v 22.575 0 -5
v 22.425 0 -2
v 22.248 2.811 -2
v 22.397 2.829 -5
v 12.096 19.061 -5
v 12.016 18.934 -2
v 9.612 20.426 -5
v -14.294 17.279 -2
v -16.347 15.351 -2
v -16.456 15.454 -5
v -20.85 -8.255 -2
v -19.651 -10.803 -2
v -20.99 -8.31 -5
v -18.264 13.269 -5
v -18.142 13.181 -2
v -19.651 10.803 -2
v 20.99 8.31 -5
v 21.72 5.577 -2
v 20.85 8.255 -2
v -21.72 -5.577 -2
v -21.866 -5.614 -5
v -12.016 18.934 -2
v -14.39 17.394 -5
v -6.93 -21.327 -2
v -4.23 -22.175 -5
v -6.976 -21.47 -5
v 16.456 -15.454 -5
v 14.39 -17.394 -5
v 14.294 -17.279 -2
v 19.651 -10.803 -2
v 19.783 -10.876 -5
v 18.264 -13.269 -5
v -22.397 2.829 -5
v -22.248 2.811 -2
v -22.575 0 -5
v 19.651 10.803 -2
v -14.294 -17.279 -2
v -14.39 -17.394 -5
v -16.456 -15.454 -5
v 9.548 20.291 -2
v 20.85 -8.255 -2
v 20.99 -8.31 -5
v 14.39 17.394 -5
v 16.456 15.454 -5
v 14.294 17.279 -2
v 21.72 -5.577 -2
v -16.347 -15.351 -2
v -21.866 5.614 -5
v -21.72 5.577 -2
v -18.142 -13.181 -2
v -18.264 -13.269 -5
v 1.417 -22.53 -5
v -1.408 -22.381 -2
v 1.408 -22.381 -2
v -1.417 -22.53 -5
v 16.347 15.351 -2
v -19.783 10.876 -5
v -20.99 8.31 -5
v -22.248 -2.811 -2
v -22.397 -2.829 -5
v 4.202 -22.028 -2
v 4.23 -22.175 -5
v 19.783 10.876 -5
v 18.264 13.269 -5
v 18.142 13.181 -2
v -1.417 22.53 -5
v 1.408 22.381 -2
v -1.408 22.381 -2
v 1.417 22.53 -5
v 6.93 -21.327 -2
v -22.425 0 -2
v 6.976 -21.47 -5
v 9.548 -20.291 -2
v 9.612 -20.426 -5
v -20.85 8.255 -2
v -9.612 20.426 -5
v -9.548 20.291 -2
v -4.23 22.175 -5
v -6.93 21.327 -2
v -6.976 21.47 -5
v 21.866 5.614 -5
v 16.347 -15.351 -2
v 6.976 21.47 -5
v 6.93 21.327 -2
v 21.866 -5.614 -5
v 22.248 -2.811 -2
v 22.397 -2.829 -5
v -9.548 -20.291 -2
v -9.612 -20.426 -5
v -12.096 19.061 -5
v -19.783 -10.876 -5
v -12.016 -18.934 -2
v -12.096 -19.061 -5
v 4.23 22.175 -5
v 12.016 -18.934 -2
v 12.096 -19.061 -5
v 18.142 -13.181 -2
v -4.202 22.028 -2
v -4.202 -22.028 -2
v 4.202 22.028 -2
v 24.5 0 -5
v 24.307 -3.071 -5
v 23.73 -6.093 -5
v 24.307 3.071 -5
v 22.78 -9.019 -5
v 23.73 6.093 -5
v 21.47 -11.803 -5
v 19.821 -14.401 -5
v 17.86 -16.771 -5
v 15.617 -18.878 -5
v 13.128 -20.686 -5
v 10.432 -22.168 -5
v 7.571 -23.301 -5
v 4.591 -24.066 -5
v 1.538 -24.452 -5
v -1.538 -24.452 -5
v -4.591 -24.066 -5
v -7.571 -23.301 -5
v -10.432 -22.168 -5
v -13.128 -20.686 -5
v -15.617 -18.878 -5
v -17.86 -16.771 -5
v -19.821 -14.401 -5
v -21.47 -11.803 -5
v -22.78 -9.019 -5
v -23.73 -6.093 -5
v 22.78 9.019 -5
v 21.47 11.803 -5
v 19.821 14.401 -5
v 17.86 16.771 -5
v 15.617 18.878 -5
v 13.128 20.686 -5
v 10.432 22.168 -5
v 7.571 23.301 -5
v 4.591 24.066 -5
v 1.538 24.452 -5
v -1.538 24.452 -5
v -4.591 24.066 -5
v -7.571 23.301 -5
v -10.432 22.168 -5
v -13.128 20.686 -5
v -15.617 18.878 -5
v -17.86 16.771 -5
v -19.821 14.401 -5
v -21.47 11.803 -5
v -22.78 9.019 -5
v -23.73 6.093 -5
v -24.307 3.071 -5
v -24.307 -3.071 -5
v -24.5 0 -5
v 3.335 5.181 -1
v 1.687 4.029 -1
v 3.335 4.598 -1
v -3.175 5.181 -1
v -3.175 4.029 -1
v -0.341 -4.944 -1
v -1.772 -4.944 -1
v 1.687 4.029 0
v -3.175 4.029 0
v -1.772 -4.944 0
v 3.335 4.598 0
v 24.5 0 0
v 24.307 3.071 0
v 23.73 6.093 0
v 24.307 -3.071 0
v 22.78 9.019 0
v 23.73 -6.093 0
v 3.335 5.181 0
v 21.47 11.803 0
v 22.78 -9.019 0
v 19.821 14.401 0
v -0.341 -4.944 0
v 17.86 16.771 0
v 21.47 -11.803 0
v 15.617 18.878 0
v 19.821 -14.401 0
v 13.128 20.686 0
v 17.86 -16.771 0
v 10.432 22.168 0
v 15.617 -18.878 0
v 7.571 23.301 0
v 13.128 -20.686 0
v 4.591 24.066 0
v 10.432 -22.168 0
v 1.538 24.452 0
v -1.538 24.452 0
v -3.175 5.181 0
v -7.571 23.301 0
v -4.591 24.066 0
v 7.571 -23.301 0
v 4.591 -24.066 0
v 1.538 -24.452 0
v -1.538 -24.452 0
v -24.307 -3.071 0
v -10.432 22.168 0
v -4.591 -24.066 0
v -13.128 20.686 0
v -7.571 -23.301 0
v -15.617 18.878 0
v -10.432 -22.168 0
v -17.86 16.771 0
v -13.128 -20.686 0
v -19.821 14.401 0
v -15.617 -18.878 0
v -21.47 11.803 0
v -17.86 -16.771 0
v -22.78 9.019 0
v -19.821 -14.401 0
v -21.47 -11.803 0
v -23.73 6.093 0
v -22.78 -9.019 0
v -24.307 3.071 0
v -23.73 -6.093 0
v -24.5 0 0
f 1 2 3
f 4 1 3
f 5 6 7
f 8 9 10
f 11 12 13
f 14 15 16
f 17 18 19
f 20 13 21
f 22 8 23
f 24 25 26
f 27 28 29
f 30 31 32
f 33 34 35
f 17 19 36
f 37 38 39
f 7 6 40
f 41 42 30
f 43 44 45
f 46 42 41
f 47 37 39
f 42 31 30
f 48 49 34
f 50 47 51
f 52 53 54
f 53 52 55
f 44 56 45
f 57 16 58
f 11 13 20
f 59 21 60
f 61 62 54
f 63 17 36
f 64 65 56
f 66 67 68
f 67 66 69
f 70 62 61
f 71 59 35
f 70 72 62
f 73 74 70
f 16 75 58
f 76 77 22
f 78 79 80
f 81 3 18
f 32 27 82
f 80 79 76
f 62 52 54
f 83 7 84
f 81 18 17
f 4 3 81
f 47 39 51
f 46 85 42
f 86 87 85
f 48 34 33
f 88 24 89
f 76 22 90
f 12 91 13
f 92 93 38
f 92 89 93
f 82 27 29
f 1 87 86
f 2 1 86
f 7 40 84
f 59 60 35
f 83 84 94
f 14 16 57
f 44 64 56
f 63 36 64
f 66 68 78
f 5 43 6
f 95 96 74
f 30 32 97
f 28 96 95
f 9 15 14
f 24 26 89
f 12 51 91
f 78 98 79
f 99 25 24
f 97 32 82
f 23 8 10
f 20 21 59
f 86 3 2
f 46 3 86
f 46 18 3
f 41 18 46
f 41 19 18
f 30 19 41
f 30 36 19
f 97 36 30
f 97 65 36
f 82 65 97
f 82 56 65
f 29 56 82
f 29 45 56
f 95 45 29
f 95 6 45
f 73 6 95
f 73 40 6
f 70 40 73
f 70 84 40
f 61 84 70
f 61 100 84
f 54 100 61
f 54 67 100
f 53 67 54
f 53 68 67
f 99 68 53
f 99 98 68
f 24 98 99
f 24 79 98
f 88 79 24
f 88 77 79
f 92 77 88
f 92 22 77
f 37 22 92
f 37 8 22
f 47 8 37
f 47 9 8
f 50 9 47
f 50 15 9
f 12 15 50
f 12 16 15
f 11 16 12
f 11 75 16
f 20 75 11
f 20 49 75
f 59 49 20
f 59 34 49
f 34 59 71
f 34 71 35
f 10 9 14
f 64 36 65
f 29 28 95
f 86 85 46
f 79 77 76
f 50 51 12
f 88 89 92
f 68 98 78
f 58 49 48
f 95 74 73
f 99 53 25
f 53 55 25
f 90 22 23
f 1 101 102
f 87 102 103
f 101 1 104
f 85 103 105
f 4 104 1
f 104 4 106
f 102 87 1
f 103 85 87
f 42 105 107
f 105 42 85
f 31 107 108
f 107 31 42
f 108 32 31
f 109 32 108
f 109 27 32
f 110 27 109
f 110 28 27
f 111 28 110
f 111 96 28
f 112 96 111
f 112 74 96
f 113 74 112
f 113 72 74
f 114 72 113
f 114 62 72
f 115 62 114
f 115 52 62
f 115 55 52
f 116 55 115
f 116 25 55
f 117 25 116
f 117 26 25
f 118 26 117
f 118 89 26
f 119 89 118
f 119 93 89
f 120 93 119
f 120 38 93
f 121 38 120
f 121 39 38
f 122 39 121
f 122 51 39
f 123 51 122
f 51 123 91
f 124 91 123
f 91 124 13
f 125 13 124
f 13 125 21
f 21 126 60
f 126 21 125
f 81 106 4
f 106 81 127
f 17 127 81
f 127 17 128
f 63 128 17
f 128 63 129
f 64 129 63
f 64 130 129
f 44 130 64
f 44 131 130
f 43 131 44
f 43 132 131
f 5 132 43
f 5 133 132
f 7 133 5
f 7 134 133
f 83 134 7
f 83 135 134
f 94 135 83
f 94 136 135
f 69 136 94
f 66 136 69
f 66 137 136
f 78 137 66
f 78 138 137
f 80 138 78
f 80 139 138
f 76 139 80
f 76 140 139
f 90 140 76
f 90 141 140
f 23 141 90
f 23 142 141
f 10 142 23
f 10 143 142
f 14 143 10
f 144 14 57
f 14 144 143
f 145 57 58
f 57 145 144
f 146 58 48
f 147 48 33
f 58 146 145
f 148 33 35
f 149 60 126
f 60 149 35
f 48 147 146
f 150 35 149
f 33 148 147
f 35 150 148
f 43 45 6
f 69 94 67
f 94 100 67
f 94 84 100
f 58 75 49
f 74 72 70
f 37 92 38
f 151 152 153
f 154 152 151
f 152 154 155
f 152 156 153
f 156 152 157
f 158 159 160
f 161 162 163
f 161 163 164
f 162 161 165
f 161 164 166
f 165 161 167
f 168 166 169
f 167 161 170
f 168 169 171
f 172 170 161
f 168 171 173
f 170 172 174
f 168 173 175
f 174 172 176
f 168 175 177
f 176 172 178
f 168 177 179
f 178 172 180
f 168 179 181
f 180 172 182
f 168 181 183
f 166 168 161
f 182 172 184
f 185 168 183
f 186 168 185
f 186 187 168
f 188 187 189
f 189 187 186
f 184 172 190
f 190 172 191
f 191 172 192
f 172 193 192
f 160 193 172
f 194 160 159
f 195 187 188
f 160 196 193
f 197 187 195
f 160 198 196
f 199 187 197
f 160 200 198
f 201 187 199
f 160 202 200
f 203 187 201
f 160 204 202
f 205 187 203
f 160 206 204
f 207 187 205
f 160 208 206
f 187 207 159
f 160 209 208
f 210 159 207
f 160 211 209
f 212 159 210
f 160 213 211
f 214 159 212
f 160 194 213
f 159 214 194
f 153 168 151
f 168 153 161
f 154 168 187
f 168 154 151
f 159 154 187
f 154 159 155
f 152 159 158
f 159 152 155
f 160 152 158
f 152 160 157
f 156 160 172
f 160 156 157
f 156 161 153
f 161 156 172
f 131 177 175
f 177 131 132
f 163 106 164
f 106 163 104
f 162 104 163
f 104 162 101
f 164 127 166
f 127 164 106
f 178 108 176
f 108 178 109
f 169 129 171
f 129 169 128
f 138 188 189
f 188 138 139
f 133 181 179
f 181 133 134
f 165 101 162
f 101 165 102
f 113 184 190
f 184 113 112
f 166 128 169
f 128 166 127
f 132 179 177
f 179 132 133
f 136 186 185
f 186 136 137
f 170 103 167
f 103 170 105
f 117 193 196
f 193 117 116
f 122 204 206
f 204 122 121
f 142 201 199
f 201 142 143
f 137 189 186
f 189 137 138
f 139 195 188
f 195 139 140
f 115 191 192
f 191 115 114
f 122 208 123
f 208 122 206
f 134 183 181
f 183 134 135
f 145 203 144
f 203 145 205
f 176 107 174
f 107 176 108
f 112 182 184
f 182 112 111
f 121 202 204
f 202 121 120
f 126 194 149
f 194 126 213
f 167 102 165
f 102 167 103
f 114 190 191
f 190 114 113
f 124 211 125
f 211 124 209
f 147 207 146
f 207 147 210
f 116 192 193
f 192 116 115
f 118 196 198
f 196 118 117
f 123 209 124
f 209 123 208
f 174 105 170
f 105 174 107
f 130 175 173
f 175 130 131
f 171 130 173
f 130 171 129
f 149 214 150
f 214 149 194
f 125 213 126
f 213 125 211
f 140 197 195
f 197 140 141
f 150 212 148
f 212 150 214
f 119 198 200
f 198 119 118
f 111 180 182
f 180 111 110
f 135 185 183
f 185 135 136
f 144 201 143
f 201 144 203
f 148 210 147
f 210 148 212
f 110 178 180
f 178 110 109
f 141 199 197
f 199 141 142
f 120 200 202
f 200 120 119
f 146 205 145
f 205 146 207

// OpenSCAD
$fn = 50;

difference() {
	union() {
		translate(v = [0, 0, -5.0]) {
			cylinder(h = 5, r = 24.5);
		}
	}
	union() {
		#translate(v = [0, 0, -5.0]) {
			cylinder(h = 3, r1 = 22.575, r2 = 22.425);
		}
		translate(v = [0, 0, -1]) {
			linear_extrude(height = 1) {
				text(font = "Impact", halign = "center", size = 10, text = "7", valign = "center");
			}
		}
	}
}
